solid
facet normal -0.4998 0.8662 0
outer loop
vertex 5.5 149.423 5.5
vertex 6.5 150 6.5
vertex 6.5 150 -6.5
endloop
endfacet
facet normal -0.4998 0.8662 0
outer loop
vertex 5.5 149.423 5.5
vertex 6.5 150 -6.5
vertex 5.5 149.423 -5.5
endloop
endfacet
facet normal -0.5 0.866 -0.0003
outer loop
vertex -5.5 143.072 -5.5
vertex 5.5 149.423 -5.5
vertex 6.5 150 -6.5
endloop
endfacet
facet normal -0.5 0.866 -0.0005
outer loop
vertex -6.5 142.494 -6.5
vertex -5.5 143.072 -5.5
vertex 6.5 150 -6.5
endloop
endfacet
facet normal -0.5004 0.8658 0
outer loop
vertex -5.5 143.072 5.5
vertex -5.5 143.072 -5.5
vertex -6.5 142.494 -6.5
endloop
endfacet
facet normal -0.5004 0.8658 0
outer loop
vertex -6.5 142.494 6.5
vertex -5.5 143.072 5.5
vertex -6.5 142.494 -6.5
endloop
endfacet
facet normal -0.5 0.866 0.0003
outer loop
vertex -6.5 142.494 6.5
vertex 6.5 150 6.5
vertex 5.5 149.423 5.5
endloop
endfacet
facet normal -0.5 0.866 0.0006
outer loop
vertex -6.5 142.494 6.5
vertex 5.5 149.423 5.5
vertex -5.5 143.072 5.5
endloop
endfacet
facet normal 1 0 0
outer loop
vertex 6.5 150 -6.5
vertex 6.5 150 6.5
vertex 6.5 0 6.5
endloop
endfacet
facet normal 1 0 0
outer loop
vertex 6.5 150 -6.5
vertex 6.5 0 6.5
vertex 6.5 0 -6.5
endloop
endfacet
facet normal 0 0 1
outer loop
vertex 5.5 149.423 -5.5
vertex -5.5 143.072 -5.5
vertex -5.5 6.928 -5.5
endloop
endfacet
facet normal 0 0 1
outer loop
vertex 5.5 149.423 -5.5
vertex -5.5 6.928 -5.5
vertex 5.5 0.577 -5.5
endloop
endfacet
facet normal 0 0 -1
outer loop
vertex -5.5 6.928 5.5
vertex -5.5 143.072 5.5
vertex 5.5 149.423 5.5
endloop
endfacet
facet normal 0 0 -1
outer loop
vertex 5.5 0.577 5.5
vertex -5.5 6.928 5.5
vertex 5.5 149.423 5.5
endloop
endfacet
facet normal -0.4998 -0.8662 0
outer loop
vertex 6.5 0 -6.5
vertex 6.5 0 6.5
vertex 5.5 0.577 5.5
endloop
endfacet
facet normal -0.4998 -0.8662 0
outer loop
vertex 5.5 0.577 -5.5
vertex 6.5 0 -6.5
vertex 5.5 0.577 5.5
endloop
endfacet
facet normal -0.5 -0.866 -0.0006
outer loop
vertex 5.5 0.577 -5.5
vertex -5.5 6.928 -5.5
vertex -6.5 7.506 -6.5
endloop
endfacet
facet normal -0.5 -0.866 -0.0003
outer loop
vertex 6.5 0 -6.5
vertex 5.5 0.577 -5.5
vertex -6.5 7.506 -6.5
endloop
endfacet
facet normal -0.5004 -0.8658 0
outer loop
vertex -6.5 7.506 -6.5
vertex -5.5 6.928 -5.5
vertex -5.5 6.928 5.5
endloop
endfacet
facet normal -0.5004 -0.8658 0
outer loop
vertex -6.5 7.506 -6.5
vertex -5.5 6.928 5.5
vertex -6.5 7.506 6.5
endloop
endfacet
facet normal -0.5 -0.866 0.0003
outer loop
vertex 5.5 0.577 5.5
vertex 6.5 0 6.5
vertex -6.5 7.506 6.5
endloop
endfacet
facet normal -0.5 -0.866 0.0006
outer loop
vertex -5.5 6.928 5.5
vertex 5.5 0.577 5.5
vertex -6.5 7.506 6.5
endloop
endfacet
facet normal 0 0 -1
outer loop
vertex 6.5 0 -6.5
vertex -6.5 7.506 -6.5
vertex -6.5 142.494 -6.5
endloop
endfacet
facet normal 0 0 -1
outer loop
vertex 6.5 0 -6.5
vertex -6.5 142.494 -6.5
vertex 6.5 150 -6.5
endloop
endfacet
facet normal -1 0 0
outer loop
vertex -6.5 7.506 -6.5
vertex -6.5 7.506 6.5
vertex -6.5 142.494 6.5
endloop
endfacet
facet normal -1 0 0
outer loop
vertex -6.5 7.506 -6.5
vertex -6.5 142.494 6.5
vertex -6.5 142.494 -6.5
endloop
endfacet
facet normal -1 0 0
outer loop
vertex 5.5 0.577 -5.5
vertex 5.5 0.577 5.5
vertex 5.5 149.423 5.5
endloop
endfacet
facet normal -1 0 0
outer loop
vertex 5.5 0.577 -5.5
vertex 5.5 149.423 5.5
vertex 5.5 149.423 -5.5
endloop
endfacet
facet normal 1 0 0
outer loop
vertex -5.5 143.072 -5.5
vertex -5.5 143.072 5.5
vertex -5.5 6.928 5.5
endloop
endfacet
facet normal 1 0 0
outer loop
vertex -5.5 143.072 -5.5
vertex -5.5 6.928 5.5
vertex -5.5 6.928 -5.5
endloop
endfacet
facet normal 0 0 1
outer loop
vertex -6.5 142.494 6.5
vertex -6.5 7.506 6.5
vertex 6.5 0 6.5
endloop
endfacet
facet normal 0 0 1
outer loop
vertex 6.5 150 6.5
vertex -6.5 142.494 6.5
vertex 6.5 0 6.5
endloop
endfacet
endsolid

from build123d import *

# Parameters (mm, degrees)
SKETCH1_W               = 13
SKETCH1_H               = 13
SKETCH1_W_2             = 11
SKETCH1_H_2             = 11
BOSS_EXTRUDE1_DEPTH     = 150
CUT_EXTRUDE1_DEPTH      = 1
CUT_EXTRUDE1_DEPTH_BACK = 14
SKETCH3_OUTSIDE_W       = 45.224
SKETCH3_OUTSIDE_H       = 182.224
CUT_EXTRUDE2_DEPTH      = 1
CUT_EXTRUDE2_DEPTH_BACK = 14


with BuildPart() as part:
    # Sketch1 → Boss-Extrude1 (new body)
    with BuildSketch(Plane(origin=(0, 0, 0), x_dir=(1, 0, 0), z_dir=(0, 1, 0))):
        Rectangle(SKETCH1_W, SKETCH1_H)
        Rectangle(SKETCH1_W_2, SKETCH1_H_2, mode=Mode.SUBTRACT)
    extrude(amount=BOSS_EXTRUDE1_DEPTH)

    # Sketch2 → Cut-Extrude1 (cut, two sides)
    with BuildSketch(Plane.XY.offset(6.5)) as cut_extrude1_sk:
        Polygon((275.941771788, 305.562279473), (6.5, 150), (-6.5, 142.494446501), (-275.941771788, -13.067832972), (-587.066330733, 525.815710604), (-35.182787157, 844.445823048), align=None)
    extrude(amount=CUT_EXTRUDE1_DEPTH, mode=Mode.SUBTRACT)
    extrude(cut_extrude1_sk.sketch, amount=-CUT_EXTRUDE1_DEPTH_BACK, mode=Mode.SUBTRACT)

    # Sketch3 outside → Cut-Extrude2 (cut, two sides)
    with BuildSketch(Plane.XY.offset(6.5)) as cut_extrude2_sk:
        with Locations((0, 75)):
            Rectangle(SKETCH3_OUTSIDE_W, SKETCH3_OUTSIDE_H)
        Polygon((6.5, 0), (-6.5, 7.505553499), (-6.5, 142.494446501), (6.5, 150), align=None, mode=Mode.SUBTRACT)
    extrude(amount=CUT_EXTRUDE2_DEPTH, mode=Mode.SUBTRACT)
    extrude(cut_extrude2_sk.sketch, amount=-CUT_EXTRUDE2_DEPTH_BACK, mode=Mode.SUBTRACT)


solid = part.part
